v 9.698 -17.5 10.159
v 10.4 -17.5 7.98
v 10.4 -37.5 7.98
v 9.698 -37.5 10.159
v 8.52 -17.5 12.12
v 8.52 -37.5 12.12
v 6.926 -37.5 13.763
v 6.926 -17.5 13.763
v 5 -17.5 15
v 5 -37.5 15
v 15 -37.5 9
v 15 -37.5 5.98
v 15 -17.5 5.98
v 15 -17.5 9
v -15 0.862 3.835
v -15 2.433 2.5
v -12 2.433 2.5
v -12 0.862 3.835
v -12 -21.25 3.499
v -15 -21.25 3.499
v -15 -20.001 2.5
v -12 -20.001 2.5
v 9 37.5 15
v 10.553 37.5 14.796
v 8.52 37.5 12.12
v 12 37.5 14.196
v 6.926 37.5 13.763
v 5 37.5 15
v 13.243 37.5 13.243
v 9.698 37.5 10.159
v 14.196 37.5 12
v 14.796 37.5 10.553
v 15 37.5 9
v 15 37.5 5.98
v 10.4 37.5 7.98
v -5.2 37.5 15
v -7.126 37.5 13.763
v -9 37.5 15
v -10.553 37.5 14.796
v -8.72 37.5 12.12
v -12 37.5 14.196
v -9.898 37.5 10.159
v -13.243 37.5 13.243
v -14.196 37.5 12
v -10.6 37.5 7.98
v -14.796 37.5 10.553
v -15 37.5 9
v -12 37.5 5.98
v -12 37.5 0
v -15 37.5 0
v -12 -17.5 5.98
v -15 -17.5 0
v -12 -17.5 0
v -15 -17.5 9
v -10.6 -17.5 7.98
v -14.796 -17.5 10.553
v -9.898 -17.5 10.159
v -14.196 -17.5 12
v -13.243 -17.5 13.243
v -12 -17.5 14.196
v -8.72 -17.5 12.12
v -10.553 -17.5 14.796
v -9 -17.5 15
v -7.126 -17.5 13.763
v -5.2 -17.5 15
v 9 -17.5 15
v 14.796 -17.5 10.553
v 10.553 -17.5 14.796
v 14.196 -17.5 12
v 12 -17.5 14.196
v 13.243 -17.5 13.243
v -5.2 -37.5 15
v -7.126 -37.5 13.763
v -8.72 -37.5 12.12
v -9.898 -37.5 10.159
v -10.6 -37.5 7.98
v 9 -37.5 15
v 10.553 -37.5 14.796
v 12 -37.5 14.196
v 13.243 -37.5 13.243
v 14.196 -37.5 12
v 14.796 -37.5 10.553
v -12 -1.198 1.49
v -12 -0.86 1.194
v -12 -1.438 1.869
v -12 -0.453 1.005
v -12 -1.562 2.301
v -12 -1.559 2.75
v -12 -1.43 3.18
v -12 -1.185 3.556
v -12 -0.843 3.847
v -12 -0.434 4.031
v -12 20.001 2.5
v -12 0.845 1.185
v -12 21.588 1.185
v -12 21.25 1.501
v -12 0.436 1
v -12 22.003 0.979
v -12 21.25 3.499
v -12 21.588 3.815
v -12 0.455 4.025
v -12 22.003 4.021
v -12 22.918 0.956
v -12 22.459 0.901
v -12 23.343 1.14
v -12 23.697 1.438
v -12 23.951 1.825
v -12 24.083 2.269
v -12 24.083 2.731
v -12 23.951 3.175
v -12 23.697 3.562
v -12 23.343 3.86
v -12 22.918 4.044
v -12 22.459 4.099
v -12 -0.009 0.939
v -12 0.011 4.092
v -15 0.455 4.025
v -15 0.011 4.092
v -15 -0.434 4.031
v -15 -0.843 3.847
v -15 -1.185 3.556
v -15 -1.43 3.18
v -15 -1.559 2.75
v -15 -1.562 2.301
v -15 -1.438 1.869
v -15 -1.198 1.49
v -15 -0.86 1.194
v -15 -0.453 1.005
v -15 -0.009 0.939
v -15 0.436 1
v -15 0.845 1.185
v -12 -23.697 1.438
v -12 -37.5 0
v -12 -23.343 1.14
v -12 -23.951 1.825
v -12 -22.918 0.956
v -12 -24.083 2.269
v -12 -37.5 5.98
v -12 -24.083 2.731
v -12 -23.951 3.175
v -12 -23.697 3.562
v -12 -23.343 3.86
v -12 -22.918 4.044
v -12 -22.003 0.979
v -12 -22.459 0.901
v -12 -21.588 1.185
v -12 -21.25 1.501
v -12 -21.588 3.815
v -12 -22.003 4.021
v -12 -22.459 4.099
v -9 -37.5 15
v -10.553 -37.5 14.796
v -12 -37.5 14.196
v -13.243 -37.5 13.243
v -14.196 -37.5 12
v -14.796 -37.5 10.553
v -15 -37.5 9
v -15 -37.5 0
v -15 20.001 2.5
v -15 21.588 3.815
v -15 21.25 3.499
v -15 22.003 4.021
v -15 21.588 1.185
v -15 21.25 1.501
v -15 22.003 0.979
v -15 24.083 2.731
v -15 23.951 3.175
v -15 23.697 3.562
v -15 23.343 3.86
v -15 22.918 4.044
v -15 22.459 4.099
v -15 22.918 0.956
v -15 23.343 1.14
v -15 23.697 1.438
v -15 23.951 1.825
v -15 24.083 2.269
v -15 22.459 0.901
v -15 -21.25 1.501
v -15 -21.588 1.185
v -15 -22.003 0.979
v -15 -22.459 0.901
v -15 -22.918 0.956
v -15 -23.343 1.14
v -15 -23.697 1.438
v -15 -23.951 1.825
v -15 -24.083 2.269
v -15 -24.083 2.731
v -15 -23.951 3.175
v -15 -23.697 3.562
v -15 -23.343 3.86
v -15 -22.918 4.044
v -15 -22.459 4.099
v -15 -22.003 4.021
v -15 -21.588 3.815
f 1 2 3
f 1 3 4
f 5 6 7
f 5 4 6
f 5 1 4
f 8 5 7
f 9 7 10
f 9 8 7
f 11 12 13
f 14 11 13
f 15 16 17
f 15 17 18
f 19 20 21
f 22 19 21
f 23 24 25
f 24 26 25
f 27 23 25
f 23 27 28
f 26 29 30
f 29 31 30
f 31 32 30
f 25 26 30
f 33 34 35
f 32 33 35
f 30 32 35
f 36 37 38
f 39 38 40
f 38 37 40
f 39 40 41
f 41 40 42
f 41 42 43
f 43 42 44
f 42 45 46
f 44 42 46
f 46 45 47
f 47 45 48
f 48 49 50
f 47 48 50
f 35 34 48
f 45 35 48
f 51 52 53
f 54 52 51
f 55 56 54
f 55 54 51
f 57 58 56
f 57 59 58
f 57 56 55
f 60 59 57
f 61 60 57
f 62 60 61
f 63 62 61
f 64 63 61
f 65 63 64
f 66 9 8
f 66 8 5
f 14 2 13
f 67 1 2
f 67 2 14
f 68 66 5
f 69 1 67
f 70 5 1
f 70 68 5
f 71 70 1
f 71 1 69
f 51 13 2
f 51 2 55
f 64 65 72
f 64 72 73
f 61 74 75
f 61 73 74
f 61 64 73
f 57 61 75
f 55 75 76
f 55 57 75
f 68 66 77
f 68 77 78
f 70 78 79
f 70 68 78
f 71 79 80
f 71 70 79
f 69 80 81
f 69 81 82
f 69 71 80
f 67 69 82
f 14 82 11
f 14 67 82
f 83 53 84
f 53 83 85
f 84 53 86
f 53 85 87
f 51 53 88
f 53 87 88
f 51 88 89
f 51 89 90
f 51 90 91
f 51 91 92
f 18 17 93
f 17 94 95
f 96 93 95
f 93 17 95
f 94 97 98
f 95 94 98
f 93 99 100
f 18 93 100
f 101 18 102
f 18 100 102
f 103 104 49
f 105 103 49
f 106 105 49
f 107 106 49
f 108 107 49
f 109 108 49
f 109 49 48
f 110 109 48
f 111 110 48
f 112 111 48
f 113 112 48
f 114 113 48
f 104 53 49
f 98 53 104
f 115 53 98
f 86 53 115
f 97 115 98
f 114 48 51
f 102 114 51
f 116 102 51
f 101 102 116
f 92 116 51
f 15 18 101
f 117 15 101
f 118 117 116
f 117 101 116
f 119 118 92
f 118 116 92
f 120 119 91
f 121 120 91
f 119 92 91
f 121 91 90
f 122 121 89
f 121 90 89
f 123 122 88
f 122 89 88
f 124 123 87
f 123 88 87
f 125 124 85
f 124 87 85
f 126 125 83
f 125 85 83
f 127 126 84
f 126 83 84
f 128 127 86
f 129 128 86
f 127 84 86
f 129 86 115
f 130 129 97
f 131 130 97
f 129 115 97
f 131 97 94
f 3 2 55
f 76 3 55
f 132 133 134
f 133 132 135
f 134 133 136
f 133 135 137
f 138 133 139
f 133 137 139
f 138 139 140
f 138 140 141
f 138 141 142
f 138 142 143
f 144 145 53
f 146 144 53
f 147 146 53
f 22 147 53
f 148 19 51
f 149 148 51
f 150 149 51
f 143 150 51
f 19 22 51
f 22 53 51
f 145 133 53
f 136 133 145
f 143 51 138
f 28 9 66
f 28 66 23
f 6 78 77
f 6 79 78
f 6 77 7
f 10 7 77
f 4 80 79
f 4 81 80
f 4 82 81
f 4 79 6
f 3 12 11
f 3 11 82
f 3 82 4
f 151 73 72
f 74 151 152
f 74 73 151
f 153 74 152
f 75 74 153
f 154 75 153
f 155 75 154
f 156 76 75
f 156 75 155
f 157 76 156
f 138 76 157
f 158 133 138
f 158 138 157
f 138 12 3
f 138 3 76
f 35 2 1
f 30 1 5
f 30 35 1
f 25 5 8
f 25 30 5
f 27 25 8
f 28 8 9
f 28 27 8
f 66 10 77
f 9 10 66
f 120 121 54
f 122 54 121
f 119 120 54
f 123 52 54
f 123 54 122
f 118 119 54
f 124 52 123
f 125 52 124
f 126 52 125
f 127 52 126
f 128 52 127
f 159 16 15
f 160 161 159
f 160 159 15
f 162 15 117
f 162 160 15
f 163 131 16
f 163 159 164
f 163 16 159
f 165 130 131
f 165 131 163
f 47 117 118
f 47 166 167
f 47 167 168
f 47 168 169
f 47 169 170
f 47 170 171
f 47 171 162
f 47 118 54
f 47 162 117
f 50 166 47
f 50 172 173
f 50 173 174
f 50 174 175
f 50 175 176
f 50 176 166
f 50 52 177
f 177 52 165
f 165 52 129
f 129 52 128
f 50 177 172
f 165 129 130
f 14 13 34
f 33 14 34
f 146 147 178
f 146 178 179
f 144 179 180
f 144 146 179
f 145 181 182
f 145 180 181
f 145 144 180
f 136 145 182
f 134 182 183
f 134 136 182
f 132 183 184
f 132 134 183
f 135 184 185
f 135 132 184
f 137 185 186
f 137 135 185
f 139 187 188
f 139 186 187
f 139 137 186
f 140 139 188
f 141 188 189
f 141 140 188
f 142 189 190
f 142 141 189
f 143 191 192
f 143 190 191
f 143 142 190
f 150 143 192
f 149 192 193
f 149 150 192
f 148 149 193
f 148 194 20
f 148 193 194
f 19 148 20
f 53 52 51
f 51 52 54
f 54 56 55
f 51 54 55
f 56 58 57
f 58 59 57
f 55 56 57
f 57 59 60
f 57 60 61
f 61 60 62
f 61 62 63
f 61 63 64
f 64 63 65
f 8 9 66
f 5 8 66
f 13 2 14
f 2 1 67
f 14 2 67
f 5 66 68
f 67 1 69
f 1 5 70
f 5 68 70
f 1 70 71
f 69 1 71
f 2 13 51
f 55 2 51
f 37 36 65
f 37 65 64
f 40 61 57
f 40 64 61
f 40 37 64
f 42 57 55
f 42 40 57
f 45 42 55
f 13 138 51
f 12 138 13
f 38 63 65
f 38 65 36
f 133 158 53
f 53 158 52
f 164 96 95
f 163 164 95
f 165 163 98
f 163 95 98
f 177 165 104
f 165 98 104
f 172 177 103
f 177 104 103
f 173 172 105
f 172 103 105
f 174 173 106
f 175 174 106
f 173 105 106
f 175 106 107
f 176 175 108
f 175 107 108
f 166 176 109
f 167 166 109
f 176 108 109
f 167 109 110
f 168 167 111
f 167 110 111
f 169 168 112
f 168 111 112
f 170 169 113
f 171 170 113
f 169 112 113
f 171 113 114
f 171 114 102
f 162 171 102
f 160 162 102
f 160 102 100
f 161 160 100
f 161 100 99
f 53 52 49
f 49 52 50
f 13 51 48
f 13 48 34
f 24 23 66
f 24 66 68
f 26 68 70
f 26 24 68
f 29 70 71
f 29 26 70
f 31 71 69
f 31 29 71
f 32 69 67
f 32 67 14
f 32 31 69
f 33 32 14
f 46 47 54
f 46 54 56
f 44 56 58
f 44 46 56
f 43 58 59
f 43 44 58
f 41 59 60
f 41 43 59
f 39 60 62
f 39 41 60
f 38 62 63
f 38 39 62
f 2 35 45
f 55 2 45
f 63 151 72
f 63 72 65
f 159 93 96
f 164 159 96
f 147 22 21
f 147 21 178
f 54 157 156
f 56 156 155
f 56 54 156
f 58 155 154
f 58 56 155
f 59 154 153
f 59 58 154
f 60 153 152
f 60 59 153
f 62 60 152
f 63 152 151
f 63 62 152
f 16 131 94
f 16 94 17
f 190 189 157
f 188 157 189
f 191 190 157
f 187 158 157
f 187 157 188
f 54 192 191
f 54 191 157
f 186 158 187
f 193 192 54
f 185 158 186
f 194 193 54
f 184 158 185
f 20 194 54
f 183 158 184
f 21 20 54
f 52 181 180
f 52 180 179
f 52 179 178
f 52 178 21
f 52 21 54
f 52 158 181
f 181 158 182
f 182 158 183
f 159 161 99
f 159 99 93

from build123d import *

# Parameters (mm, degrees)
SKETCH1_W              = 75
SKETCH1_H              = 30
BOSS_EXTRUDE1_DEPTH    = 15
SKETCH2_W              = 10.2
SKETCH2_H              = 7.02
SKETCH2_W_2            = 24
SKETCH2_H_2            = 5.98
CUT_EXTRUDE1_DEPTH     = 78.942286341
CUT_EXTRUDE2_DEPTH     = 51.311529494
FILLET2_R              = 6
SKETCH5_W              = 3
SKETCH5_H              = 5.98
CUT_EXTRUDE3_DEPTH     = 78.942286341
SPLIT1_SURFACE_1_BACK  = 83.158
SPLIT1_SURFACE_1_DEPTH = 166.316
SPLIT1_SURFACE_2_BACK  = 83.158
SPLIT1_SURFACE_2_DEPTH = 166.316


with BuildPart() as part:
    # Sketch1 → Boss-Extrude1 (new body)
    with BuildSketch(Plane(origin=(0, 0, 0), x_dir=(0, 1, 0), z_dir=(0, 0, 1))):
        Rectangle(SKETCH1_W, SKETCH1_H)
    extrude(amount=BOSS_EXTRUDE1_DEPTH)

    # Sketch2 → Cut-Extrude1 (cut, through all)
    with BuildSketch(Plane(origin=(0, 37.5, 0), x_dir=(-1, 0, 0), z_dir=(0, 1, 0))):
        with BuildLine():
            ThreePointArc((-10.4, 7.98), (-8.519540319, 12.12041563), (-5, 15))
            Line((-5, 15), (-5, 7.98))
            Line((-5, 7.98), (-10.4, 7.98))
        make_face()
        with Locations((0.1, 11.49)):
            Rectangle(SKETCH2_W, SKETCH2_H)
        with BuildLine():
            ThreePointArc((5.2, 15), (8.719540319, 12.12041563), (10.6, 7.98))
            Line((10.6, 7.98), (5.2, 7.98))
            Line((5.2, 7.98), (5.2, 15))
        make_face()
        with Locations((0, 2.99)):
            Rectangle(SKETCH2_W_2, SKETCH2_H_2)
    extrude(amount=-CUT_EXTRUDE1_DEPTH, mode=Mode.SUBTRACT)

    # Sketch3 → Cut-Extrude2 (cut, through all)
    with BuildSketch(Plane.YZ.offset(15)):
        with BuildLine():
            Line((2.433108223, 2.5), (0.861958837, 3.835399675))
            ThreePointArc((0.861958837, 3.835399675), (-1.576526263, 2.525277483), (0.845247168, 1.184515316))
            Line((0.845247168, 1.184515316), (2.433108223, 2.5))
        make_face()
        with BuildLine():
            Line((-20.001296975, 2.5), (-21.249987066, 1.50126697))
            ThreePointArc((-21.249987066, 1.50126697), (-24.1, 2.499983501), (-21.250007664, 3.49875881))
            Line((-21.250007664, 3.49875881), (-20.001296975, 2.5))
        make_face()
        with BuildLine():
            Line((20.001296975, 2.5), (21.249987066, 1.50126697))
            ThreePointArc((21.249987066, 1.50126697), (24.1, 2.499983501), (21.250007664, 3.49875881))
            Line((21.250007664, 3.49875881), (20.001296975, 2.5))
        make_face()
    extrude(amount=-CUT_EXTRUDE2_DEPTH, mode=Mode.SUBTRACT)

    # Fillet2
    fillet2_edges = [part.edges().sort_by_distance(p)[0] for p in [
        (15, 0, 15),
        (-15, 0, 15),
    ]]
    fillet(fillet2_edges, radius=FILLET2_R)

    # Sketch5 → Cut-Extrude3 (cut, through all)
    with BuildSketch(Plane.XZ.offset(37.5)):
        with Locations((13.5, 2.99)):
            Rectangle(SKETCH5_W, SKETCH5_H)
    extrude(amount=-CUT_EXTRUDE3_DEPTH, mode=Mode.SUBTRACT)


with BuildPart() as body_2:
    # Split1: the piece behind the surface
    add(part.part)
    # Split1 surface: a surface, the sketch's curves swept straight by 166.316 mm
    with BuildLine(Plane(origin=(0, 0, 0), x_dir=(1, 0, 0), z_dir=(0, 0, -1)).offset(-SPLIT1_SURFACE_1_BACK), mode=Mode.PRIVATE) as split1_surface_1_path:
        Line((-15, 17.5), (15, 17.5))
    split1_surface_1 = Shell.extrude(split1_surface_1_path.wire(), (0 * SPLIT1_SURFACE_1_DEPTH, 0 * SPLIT1_SURFACE_1_DEPTH, -1 * SPLIT1_SURFACE_1_DEPTH))
    split(bisect_by=split1_surface_1, keep=Keep.BOTTOM)


with BuildPart() as part_1:
    add(part.part)

    # Split1: split by a surface, the side it looks to stays
    # Split1 surface: a surface, the sketch's curves swept straight by 166.316 mm
    with BuildLine(Plane(origin=(0, 0, 0), x_dir=(1, 0, 0), z_dir=(0, 0, -1)).offset(-SPLIT1_SURFACE_2_BACK), mode=Mode.PRIVATE) as split1_surface_2_path:
        Line((-15, 17.5), (15, 17.5))
    split1_surface_2 = Shell.extrude(split1_surface_2_path.wire(), (0 * SPLIT1_SURFACE_2_DEPTH, 0 * SPLIT1_SURFACE_2_DEPTH, -1 * SPLIT1_SURFACE_2_DEPTH))
    split(bisect_by=split1_surface_2, keep=Keep.TOP)


solid = Compound([body_2.part, part_1.part])
